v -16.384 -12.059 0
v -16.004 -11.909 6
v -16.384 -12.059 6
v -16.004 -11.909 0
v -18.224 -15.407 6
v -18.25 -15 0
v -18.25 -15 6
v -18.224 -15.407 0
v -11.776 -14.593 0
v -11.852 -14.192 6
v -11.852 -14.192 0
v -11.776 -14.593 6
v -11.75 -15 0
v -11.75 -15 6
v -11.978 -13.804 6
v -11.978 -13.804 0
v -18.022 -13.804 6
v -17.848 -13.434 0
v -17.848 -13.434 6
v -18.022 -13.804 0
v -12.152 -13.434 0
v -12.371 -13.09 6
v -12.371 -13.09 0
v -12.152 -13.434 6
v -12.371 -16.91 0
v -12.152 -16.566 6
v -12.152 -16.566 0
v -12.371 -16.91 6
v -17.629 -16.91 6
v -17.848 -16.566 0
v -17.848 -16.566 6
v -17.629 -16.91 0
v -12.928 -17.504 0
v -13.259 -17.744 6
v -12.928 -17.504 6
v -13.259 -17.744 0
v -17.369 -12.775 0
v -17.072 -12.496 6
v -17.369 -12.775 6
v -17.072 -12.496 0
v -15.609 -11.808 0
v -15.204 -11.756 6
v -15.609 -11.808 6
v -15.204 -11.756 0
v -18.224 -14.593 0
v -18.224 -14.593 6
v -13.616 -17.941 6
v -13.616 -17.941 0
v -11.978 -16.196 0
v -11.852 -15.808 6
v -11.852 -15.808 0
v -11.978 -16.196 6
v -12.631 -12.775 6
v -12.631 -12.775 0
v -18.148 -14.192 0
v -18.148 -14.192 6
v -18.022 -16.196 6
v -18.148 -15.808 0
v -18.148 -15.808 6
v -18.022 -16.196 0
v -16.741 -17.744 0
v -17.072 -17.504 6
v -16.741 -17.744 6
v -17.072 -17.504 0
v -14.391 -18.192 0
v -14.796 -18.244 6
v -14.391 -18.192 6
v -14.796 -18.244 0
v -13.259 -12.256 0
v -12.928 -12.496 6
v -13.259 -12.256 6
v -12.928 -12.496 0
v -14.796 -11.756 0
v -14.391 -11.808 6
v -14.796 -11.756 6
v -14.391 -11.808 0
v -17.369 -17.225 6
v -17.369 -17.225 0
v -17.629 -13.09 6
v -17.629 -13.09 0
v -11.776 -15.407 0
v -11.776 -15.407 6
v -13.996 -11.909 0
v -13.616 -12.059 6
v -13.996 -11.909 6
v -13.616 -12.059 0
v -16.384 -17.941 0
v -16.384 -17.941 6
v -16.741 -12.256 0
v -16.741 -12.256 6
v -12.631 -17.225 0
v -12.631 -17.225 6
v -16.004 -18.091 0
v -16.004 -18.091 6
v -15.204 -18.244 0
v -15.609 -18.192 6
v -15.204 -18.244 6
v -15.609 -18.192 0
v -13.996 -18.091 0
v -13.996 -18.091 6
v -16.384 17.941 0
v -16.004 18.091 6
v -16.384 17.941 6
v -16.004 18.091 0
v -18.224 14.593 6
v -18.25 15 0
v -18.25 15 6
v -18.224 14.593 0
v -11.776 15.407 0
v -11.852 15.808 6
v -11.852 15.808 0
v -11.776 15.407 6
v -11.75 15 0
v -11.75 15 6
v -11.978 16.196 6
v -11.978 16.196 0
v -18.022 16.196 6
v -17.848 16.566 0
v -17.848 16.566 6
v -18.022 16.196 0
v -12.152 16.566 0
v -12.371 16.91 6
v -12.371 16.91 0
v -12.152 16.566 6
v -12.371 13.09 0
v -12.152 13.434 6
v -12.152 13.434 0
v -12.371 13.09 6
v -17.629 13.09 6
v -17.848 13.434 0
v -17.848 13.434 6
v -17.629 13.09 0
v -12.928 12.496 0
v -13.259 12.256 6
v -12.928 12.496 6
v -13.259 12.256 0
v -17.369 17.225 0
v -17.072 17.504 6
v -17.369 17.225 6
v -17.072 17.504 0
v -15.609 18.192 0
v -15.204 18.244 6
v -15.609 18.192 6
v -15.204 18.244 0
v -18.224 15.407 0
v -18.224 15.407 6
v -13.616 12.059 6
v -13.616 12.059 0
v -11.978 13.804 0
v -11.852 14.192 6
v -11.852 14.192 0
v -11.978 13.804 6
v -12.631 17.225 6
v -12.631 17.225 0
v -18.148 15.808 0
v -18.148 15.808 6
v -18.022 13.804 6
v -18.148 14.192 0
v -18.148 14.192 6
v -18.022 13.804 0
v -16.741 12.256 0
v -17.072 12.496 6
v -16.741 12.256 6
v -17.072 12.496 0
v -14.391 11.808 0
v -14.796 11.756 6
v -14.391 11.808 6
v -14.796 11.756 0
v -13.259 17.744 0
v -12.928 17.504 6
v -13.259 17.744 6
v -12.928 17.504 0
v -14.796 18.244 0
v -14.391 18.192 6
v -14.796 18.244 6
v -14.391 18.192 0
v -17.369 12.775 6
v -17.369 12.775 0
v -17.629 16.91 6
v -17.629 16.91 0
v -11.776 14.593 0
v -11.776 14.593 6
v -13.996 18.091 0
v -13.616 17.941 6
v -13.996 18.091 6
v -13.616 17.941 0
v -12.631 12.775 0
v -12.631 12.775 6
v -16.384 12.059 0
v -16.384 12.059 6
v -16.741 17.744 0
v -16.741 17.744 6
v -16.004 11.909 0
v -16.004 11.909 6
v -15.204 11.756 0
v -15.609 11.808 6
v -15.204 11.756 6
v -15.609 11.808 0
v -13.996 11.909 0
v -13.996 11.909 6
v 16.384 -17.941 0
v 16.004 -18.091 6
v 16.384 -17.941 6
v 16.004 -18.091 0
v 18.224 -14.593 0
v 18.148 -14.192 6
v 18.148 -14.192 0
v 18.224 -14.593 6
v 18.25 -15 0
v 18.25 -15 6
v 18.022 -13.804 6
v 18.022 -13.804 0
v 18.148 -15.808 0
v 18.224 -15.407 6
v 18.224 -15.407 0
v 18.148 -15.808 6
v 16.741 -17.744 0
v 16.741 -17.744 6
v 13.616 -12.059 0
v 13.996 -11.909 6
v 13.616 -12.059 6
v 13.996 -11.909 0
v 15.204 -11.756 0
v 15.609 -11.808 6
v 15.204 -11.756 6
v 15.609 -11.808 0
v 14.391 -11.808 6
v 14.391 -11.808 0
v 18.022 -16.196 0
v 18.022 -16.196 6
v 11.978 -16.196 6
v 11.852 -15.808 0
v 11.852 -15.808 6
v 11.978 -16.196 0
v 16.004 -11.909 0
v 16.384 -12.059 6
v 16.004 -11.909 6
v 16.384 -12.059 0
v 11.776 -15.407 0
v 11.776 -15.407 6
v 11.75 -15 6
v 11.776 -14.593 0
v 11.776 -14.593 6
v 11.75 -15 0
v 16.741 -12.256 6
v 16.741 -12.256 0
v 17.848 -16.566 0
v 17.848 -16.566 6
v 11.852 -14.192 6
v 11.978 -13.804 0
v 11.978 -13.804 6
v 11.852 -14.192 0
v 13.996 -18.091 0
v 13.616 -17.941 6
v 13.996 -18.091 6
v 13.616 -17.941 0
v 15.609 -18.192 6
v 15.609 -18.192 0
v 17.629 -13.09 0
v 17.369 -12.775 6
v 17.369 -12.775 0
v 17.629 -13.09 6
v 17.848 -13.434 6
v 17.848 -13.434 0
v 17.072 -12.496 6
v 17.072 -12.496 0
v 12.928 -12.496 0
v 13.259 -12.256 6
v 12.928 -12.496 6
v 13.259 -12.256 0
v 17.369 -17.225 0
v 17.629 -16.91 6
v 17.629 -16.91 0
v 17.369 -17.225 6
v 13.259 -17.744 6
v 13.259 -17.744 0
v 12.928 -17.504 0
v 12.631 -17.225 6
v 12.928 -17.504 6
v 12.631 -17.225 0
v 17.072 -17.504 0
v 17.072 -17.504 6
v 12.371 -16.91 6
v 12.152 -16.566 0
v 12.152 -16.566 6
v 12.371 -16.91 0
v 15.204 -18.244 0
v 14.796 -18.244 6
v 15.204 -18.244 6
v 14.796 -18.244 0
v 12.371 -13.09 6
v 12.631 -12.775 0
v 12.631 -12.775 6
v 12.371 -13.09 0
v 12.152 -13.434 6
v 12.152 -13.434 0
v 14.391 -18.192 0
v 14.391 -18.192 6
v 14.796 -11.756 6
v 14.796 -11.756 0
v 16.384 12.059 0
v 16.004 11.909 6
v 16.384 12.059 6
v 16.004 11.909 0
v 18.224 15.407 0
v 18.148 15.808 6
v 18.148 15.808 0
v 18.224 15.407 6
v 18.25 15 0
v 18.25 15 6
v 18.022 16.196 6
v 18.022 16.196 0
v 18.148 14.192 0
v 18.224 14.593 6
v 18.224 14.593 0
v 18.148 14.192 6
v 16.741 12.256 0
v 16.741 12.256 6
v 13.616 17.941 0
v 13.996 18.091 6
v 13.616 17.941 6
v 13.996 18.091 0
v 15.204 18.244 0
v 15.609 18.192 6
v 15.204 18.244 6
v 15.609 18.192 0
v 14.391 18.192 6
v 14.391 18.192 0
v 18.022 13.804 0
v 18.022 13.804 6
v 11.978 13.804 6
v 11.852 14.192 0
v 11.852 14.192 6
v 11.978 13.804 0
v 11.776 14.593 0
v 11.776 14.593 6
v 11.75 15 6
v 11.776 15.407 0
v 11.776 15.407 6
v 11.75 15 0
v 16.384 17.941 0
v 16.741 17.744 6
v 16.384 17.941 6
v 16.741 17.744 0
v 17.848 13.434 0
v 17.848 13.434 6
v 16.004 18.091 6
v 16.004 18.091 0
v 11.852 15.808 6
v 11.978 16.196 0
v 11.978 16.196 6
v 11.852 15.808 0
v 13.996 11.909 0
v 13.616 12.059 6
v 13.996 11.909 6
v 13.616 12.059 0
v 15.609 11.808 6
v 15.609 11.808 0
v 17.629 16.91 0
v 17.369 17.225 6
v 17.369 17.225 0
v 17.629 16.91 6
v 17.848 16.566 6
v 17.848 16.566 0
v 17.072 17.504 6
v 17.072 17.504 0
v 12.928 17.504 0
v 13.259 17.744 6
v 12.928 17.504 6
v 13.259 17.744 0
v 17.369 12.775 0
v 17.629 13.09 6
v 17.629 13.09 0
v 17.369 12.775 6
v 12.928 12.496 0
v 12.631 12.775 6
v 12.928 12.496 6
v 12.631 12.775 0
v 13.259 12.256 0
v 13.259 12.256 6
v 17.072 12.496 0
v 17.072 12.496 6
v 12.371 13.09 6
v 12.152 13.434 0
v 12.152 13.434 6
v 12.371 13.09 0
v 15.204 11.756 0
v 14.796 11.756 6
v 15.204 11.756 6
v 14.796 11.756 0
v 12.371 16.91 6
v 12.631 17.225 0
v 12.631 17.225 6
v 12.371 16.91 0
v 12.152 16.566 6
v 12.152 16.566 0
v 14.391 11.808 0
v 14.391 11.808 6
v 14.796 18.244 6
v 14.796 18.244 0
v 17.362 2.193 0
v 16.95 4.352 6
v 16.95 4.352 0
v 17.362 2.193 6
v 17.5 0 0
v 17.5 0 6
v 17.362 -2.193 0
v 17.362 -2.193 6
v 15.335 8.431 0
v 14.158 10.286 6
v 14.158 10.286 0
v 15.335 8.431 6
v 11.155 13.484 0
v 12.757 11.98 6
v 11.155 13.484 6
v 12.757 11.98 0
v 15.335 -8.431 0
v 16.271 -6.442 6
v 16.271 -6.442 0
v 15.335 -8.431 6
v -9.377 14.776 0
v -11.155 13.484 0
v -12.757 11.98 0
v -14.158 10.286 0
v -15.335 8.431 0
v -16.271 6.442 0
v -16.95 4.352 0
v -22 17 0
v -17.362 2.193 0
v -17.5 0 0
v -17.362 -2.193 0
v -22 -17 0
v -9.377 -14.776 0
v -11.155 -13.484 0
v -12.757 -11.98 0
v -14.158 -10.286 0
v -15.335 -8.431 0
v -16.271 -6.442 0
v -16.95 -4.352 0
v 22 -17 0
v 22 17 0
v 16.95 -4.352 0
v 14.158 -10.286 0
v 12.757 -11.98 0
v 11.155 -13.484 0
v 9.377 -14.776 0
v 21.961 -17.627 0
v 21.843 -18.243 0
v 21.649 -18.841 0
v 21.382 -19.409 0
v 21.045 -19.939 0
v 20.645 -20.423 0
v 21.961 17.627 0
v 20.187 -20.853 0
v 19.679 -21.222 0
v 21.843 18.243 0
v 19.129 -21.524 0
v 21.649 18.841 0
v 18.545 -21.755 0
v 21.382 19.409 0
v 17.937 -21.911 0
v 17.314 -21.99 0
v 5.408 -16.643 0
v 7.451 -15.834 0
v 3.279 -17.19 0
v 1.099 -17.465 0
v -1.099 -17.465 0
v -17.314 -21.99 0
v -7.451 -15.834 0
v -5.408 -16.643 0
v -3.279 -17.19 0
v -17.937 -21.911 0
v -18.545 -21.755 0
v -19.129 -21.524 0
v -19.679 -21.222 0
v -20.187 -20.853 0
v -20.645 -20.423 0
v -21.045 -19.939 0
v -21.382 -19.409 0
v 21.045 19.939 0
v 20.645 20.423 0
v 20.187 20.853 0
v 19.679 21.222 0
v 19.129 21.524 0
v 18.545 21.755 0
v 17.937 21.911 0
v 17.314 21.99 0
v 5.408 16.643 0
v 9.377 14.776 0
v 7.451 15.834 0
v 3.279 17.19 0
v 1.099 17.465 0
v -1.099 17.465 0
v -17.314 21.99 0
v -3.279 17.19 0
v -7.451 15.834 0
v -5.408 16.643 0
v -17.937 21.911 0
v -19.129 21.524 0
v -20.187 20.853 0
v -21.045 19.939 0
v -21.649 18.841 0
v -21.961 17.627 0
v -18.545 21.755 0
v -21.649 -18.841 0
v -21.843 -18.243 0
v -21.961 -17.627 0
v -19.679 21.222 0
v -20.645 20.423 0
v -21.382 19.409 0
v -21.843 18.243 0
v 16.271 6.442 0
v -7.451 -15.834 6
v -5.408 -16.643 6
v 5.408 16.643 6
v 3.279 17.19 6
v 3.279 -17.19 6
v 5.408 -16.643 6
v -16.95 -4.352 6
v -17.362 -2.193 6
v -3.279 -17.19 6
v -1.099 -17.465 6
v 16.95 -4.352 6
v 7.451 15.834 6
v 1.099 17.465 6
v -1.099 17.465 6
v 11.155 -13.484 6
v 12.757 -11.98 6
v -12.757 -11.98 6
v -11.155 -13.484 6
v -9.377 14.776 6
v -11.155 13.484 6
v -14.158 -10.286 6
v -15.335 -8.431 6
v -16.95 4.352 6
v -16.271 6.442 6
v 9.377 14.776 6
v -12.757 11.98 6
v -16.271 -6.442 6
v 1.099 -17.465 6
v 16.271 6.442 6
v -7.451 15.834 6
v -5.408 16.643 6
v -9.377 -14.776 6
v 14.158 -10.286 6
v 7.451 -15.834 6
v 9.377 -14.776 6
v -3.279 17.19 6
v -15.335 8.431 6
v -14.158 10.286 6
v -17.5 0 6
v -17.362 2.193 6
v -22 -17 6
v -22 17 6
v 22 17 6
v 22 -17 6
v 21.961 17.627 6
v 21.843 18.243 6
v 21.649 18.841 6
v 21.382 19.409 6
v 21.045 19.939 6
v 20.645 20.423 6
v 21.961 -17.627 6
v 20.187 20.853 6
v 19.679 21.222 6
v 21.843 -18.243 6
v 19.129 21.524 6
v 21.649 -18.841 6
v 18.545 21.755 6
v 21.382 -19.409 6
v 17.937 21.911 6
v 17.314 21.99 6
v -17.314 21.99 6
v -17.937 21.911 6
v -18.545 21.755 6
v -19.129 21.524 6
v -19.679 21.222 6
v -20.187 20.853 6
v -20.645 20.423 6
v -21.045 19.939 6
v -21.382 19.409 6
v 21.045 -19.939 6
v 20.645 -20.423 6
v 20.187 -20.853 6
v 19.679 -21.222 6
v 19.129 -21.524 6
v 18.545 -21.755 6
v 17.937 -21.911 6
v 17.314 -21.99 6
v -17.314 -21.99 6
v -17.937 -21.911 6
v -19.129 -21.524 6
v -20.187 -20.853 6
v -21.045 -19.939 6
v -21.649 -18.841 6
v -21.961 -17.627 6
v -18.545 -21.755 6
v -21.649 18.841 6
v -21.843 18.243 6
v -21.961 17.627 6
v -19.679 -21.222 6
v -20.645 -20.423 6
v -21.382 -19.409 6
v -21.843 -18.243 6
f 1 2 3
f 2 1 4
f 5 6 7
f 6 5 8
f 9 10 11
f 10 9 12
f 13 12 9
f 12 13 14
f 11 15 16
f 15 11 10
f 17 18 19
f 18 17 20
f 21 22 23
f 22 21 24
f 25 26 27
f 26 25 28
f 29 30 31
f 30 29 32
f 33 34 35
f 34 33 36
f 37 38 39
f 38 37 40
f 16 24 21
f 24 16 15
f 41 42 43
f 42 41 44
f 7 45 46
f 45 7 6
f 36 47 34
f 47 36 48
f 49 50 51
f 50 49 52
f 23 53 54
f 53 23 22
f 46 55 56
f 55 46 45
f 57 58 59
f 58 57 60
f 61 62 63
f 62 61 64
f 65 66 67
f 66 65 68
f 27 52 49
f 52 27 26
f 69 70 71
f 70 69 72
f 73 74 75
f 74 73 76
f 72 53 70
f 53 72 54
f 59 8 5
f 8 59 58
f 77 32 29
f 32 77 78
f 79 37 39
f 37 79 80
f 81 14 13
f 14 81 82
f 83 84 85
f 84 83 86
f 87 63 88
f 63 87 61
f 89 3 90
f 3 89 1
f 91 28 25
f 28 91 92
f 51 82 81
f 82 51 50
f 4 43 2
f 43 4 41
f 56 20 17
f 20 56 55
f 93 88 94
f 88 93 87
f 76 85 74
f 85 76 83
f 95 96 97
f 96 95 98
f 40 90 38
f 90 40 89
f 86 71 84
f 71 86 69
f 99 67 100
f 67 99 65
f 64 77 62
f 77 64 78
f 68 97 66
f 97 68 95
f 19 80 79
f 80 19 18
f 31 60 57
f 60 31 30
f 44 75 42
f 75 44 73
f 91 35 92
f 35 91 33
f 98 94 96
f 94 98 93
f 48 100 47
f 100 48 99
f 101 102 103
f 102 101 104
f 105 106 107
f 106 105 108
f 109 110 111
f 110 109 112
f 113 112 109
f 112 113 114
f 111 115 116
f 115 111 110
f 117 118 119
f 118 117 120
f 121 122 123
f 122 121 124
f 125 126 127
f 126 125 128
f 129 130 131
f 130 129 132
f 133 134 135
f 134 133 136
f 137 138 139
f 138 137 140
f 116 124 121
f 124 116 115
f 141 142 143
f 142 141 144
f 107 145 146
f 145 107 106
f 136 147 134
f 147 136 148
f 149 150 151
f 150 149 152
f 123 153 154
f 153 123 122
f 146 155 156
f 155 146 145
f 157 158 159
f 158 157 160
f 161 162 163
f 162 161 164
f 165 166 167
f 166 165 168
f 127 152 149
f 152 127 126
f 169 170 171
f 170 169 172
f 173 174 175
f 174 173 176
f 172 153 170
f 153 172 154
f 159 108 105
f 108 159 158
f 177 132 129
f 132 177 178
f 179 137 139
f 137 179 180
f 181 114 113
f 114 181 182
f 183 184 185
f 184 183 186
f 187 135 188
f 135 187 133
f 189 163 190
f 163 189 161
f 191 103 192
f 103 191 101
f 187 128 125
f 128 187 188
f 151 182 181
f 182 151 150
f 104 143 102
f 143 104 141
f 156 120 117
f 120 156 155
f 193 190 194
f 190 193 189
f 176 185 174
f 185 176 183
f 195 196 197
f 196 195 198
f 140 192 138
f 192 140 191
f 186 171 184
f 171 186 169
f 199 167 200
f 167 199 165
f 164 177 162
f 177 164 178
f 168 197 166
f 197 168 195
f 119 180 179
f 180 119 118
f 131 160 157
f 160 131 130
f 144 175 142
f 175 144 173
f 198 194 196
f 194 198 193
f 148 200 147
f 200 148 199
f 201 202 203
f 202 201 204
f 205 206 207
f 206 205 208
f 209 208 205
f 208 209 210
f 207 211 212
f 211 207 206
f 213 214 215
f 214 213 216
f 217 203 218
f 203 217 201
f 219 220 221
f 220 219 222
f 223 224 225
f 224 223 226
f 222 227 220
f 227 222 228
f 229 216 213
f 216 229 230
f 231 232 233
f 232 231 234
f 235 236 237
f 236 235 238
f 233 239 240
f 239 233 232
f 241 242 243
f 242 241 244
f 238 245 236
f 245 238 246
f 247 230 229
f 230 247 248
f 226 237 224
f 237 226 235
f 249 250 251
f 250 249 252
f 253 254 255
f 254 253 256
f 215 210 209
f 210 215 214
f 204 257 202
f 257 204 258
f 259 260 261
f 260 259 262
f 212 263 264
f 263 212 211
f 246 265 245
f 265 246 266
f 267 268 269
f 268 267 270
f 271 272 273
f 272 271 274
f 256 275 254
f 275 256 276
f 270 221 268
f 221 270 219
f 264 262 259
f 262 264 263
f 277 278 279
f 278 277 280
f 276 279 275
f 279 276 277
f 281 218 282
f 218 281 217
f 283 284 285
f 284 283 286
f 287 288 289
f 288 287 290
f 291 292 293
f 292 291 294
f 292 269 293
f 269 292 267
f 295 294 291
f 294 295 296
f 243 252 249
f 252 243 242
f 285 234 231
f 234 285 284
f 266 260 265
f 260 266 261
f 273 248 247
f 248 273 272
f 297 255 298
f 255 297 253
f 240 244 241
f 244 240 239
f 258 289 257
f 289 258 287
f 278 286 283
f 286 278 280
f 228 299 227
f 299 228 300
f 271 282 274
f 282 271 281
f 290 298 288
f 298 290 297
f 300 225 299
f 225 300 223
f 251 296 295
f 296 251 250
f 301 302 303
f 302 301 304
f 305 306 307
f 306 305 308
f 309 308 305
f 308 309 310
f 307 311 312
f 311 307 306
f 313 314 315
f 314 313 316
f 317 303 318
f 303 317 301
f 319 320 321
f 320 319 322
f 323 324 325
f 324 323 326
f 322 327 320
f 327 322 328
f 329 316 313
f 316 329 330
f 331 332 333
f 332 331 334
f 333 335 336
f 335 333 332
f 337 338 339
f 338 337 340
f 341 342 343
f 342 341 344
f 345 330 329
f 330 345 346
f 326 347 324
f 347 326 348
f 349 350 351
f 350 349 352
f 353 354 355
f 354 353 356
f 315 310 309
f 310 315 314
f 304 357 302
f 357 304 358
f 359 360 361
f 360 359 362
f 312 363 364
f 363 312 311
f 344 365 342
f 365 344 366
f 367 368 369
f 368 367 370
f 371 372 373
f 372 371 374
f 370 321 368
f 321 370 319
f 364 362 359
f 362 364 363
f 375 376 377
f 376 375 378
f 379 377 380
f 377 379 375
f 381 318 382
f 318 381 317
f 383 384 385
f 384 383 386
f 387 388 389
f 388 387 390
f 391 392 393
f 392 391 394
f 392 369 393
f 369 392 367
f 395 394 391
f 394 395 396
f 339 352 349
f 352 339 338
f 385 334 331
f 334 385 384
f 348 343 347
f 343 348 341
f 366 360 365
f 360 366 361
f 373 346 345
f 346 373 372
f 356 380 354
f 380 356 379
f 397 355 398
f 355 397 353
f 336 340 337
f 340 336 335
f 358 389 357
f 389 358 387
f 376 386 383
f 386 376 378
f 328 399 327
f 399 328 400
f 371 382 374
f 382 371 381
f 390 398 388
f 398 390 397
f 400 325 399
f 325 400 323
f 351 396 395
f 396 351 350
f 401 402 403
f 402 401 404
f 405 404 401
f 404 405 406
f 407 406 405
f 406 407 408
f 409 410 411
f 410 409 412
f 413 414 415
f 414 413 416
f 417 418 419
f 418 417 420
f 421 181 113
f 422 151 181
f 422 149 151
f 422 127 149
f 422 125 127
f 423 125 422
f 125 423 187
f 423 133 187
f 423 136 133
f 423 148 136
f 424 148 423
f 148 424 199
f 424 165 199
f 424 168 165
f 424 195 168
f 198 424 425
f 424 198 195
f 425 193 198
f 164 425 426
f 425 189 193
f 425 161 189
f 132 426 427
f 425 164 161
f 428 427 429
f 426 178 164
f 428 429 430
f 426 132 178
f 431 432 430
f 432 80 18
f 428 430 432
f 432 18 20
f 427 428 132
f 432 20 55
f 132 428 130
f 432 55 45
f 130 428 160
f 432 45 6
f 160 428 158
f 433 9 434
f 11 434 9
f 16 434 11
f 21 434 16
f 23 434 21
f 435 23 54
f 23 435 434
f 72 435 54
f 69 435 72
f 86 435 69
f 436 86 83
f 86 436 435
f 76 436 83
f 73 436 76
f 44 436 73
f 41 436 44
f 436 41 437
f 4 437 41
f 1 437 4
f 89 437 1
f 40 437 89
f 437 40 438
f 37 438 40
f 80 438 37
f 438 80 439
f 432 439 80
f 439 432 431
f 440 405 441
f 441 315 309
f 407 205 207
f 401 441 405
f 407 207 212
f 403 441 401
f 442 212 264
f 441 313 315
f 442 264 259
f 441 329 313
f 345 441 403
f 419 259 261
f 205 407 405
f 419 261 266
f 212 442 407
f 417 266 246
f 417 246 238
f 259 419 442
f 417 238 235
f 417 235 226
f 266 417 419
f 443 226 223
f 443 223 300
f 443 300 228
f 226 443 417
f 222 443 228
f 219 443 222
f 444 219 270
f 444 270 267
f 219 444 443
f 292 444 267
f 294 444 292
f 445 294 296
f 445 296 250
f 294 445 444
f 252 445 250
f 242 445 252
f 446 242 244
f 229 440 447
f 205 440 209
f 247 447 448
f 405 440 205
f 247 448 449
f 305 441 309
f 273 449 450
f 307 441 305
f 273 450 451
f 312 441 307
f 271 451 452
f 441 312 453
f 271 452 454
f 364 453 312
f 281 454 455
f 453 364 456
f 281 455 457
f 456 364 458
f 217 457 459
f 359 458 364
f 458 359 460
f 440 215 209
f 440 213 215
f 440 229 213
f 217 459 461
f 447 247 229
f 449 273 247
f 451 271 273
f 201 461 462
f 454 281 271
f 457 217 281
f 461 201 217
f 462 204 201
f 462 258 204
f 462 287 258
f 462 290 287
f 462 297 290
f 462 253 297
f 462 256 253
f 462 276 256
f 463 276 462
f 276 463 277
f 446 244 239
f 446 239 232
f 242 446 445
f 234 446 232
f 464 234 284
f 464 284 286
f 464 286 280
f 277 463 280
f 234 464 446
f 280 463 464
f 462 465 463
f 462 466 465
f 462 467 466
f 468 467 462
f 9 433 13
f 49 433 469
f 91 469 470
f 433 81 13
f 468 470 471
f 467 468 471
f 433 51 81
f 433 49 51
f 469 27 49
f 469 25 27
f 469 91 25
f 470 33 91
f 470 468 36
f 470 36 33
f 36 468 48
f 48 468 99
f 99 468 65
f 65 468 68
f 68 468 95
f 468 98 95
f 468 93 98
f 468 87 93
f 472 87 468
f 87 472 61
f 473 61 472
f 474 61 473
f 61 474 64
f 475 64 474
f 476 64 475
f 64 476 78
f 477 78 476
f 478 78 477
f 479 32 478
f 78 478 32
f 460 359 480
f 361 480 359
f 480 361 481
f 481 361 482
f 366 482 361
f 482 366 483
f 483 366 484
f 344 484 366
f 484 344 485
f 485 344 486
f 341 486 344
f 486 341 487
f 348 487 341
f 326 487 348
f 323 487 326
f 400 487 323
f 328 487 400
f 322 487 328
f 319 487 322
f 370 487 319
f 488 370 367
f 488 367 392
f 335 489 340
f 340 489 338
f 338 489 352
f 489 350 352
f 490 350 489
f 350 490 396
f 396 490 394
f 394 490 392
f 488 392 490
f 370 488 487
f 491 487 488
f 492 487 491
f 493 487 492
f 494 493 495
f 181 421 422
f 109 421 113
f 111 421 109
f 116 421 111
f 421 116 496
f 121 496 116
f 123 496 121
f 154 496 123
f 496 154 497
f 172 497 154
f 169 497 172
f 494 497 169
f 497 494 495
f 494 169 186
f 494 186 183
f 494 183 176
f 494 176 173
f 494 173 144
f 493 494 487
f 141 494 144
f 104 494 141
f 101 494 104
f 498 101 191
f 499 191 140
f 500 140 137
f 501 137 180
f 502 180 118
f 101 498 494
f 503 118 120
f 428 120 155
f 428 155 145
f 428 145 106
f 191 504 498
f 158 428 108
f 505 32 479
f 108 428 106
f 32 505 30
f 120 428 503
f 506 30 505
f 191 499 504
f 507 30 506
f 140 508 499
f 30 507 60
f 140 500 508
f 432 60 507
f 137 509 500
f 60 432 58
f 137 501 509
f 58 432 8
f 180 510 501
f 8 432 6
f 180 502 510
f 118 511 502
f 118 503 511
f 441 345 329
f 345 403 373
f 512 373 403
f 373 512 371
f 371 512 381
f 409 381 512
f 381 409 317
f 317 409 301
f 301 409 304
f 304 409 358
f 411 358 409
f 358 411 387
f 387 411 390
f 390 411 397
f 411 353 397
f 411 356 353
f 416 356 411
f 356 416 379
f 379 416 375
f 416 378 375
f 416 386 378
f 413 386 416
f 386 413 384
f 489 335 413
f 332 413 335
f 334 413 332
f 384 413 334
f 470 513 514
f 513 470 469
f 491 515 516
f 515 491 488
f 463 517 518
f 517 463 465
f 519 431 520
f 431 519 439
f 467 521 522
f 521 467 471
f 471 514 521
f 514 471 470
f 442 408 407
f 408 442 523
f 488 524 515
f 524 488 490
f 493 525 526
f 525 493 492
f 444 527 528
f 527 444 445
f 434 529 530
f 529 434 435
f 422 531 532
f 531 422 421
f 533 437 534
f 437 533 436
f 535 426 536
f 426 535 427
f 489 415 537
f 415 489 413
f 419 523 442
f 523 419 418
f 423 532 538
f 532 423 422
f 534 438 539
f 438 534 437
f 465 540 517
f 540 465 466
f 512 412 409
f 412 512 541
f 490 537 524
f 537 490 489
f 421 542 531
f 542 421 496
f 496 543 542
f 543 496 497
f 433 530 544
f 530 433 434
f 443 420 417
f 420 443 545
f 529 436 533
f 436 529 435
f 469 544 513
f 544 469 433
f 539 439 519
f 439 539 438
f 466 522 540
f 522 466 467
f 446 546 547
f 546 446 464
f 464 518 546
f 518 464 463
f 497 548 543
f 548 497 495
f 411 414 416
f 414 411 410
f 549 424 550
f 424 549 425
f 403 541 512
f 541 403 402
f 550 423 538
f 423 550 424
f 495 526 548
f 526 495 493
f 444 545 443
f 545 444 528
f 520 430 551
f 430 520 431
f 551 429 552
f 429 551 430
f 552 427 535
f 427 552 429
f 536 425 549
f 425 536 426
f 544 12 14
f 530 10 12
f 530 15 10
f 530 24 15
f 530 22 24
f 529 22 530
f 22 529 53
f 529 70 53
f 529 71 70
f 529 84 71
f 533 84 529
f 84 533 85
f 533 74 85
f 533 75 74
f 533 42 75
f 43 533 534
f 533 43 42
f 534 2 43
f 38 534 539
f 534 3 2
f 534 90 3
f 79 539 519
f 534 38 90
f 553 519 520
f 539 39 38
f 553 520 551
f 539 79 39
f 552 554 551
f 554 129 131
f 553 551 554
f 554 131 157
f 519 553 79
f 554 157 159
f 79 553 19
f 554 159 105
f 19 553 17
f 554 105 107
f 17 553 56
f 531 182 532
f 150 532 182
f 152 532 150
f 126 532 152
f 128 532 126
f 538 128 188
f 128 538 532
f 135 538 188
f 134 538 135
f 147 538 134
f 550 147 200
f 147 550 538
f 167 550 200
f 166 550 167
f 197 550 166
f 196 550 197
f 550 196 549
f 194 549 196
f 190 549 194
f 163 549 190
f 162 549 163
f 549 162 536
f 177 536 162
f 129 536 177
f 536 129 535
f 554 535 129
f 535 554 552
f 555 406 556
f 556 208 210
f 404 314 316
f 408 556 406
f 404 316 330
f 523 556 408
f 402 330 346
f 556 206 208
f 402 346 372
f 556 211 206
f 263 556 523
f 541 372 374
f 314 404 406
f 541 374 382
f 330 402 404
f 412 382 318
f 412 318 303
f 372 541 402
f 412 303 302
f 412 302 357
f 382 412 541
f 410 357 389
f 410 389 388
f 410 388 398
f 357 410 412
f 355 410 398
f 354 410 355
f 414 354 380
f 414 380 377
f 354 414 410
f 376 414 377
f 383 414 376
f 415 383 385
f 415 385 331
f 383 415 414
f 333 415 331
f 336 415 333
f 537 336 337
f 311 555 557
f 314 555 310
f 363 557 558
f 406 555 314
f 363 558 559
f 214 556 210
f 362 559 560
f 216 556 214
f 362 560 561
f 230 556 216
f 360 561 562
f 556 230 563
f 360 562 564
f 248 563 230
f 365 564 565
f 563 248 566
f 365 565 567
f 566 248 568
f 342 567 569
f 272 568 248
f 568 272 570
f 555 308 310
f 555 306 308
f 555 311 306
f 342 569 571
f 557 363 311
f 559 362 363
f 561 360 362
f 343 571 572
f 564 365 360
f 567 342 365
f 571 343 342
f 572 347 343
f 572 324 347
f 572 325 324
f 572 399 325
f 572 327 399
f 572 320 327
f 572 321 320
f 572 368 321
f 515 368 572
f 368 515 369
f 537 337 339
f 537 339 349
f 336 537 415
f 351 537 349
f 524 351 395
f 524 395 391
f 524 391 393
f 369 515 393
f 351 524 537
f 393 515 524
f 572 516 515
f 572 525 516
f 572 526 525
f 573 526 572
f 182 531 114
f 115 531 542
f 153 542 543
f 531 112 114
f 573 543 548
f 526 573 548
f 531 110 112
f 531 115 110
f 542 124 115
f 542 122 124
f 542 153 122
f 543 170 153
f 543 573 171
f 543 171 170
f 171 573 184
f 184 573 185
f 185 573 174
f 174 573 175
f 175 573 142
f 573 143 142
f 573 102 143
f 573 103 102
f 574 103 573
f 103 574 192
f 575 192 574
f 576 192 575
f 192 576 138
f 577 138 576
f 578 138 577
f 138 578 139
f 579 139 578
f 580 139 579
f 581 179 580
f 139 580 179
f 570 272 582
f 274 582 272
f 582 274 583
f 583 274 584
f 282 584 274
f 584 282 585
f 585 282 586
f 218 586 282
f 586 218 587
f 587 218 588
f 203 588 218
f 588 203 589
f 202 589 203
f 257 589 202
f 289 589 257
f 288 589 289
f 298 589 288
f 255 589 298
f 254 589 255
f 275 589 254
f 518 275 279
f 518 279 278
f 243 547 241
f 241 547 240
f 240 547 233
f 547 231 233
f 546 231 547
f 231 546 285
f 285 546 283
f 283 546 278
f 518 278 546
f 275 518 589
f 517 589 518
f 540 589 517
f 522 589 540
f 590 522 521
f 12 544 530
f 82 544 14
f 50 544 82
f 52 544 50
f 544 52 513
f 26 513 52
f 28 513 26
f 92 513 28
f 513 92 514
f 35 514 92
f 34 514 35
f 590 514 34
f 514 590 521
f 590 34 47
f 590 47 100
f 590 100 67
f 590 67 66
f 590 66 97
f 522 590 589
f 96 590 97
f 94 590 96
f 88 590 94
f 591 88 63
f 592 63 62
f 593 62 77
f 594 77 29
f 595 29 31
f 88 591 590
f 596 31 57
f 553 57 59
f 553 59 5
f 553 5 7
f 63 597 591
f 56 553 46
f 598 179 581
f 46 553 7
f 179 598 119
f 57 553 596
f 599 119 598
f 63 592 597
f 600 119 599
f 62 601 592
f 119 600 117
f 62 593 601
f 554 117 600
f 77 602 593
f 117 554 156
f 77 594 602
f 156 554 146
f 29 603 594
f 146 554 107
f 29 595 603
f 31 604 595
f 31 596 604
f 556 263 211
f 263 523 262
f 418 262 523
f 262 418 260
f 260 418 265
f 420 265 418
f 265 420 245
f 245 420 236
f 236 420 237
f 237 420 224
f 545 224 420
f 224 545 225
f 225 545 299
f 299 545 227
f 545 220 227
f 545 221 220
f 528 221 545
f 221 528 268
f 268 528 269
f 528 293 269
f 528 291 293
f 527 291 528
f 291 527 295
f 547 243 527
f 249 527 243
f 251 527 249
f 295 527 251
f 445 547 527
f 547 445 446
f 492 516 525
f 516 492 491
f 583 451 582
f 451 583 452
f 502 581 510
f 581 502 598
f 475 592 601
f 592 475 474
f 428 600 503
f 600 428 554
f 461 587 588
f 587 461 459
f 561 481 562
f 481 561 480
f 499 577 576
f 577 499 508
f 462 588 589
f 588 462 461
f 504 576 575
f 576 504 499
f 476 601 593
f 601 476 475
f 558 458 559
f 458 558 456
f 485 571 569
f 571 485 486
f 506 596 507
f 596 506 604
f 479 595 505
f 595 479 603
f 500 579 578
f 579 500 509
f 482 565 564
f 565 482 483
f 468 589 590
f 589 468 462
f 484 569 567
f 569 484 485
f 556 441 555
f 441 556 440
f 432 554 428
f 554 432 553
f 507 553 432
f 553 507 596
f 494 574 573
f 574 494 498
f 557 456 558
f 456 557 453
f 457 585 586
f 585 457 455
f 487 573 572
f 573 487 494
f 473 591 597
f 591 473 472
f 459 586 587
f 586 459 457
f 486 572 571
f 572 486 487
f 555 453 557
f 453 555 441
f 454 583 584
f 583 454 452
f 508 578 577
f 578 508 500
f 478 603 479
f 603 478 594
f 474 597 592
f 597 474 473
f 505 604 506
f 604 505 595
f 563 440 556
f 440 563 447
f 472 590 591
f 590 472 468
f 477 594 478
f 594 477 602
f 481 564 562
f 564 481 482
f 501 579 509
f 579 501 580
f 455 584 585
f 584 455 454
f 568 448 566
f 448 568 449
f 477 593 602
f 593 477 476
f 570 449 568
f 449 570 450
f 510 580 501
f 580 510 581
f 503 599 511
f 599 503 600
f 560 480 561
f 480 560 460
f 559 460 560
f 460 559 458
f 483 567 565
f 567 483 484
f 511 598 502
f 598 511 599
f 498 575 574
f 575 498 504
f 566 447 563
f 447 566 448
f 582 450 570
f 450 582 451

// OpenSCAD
$fn = 50;

difference() {
	union() {
		hull() {
			translate(v = [-17.0, 17.0, 0]) {
				cylinder(h = 6, r = 5);
			}
			translate(v = [17.0, 17.0, 0]) {
				cylinder(h = 6, r = 5);
			}
			translate(v = [-17.0, -17.0, 0]) {
				cylinder(h = 6, r = 5);
			}
			translate(v = [17.0, -17.0, 0]) {
				cylinder(h = 6, r = 5);
			}
		}
	}
	union() {
		translate(v = [-15.0, -15.0, -100.0]) {
			cylinder(h = 200, r = 3.25);
		}
		translate(v = [-15.0, 15.0, -100.0]) {
			cylinder(h = 200, r = 3.25);
		}
		translate(v = [15.0, -15.0, -100.0]) {
			cylinder(h = 200, r = 3.25);
		}
		translate(v = [15.0, 15.0, -100.0]) {
			cylinder(h = 200, r = 3.25);
		}
		translate(v = [-15.0, -15.0, -100.0]) {
			cylinder(h = 200, r = 1.8);
		}
		translate(v = [-15.0, 15.0, -100.0]) {
			cylinder(h = 200, r = 1.8);
		}
		translate(v = [15.0, -15.0, -100.0]) {
			cylinder(h = 200, r = 1.8);
		}
		translate(v = [15.0, 15.0, -100.0]) {
			cylinder(h = 200, r = 1.8);
		}
		cylinder(h = 6, r = 17.5);
	}
}
